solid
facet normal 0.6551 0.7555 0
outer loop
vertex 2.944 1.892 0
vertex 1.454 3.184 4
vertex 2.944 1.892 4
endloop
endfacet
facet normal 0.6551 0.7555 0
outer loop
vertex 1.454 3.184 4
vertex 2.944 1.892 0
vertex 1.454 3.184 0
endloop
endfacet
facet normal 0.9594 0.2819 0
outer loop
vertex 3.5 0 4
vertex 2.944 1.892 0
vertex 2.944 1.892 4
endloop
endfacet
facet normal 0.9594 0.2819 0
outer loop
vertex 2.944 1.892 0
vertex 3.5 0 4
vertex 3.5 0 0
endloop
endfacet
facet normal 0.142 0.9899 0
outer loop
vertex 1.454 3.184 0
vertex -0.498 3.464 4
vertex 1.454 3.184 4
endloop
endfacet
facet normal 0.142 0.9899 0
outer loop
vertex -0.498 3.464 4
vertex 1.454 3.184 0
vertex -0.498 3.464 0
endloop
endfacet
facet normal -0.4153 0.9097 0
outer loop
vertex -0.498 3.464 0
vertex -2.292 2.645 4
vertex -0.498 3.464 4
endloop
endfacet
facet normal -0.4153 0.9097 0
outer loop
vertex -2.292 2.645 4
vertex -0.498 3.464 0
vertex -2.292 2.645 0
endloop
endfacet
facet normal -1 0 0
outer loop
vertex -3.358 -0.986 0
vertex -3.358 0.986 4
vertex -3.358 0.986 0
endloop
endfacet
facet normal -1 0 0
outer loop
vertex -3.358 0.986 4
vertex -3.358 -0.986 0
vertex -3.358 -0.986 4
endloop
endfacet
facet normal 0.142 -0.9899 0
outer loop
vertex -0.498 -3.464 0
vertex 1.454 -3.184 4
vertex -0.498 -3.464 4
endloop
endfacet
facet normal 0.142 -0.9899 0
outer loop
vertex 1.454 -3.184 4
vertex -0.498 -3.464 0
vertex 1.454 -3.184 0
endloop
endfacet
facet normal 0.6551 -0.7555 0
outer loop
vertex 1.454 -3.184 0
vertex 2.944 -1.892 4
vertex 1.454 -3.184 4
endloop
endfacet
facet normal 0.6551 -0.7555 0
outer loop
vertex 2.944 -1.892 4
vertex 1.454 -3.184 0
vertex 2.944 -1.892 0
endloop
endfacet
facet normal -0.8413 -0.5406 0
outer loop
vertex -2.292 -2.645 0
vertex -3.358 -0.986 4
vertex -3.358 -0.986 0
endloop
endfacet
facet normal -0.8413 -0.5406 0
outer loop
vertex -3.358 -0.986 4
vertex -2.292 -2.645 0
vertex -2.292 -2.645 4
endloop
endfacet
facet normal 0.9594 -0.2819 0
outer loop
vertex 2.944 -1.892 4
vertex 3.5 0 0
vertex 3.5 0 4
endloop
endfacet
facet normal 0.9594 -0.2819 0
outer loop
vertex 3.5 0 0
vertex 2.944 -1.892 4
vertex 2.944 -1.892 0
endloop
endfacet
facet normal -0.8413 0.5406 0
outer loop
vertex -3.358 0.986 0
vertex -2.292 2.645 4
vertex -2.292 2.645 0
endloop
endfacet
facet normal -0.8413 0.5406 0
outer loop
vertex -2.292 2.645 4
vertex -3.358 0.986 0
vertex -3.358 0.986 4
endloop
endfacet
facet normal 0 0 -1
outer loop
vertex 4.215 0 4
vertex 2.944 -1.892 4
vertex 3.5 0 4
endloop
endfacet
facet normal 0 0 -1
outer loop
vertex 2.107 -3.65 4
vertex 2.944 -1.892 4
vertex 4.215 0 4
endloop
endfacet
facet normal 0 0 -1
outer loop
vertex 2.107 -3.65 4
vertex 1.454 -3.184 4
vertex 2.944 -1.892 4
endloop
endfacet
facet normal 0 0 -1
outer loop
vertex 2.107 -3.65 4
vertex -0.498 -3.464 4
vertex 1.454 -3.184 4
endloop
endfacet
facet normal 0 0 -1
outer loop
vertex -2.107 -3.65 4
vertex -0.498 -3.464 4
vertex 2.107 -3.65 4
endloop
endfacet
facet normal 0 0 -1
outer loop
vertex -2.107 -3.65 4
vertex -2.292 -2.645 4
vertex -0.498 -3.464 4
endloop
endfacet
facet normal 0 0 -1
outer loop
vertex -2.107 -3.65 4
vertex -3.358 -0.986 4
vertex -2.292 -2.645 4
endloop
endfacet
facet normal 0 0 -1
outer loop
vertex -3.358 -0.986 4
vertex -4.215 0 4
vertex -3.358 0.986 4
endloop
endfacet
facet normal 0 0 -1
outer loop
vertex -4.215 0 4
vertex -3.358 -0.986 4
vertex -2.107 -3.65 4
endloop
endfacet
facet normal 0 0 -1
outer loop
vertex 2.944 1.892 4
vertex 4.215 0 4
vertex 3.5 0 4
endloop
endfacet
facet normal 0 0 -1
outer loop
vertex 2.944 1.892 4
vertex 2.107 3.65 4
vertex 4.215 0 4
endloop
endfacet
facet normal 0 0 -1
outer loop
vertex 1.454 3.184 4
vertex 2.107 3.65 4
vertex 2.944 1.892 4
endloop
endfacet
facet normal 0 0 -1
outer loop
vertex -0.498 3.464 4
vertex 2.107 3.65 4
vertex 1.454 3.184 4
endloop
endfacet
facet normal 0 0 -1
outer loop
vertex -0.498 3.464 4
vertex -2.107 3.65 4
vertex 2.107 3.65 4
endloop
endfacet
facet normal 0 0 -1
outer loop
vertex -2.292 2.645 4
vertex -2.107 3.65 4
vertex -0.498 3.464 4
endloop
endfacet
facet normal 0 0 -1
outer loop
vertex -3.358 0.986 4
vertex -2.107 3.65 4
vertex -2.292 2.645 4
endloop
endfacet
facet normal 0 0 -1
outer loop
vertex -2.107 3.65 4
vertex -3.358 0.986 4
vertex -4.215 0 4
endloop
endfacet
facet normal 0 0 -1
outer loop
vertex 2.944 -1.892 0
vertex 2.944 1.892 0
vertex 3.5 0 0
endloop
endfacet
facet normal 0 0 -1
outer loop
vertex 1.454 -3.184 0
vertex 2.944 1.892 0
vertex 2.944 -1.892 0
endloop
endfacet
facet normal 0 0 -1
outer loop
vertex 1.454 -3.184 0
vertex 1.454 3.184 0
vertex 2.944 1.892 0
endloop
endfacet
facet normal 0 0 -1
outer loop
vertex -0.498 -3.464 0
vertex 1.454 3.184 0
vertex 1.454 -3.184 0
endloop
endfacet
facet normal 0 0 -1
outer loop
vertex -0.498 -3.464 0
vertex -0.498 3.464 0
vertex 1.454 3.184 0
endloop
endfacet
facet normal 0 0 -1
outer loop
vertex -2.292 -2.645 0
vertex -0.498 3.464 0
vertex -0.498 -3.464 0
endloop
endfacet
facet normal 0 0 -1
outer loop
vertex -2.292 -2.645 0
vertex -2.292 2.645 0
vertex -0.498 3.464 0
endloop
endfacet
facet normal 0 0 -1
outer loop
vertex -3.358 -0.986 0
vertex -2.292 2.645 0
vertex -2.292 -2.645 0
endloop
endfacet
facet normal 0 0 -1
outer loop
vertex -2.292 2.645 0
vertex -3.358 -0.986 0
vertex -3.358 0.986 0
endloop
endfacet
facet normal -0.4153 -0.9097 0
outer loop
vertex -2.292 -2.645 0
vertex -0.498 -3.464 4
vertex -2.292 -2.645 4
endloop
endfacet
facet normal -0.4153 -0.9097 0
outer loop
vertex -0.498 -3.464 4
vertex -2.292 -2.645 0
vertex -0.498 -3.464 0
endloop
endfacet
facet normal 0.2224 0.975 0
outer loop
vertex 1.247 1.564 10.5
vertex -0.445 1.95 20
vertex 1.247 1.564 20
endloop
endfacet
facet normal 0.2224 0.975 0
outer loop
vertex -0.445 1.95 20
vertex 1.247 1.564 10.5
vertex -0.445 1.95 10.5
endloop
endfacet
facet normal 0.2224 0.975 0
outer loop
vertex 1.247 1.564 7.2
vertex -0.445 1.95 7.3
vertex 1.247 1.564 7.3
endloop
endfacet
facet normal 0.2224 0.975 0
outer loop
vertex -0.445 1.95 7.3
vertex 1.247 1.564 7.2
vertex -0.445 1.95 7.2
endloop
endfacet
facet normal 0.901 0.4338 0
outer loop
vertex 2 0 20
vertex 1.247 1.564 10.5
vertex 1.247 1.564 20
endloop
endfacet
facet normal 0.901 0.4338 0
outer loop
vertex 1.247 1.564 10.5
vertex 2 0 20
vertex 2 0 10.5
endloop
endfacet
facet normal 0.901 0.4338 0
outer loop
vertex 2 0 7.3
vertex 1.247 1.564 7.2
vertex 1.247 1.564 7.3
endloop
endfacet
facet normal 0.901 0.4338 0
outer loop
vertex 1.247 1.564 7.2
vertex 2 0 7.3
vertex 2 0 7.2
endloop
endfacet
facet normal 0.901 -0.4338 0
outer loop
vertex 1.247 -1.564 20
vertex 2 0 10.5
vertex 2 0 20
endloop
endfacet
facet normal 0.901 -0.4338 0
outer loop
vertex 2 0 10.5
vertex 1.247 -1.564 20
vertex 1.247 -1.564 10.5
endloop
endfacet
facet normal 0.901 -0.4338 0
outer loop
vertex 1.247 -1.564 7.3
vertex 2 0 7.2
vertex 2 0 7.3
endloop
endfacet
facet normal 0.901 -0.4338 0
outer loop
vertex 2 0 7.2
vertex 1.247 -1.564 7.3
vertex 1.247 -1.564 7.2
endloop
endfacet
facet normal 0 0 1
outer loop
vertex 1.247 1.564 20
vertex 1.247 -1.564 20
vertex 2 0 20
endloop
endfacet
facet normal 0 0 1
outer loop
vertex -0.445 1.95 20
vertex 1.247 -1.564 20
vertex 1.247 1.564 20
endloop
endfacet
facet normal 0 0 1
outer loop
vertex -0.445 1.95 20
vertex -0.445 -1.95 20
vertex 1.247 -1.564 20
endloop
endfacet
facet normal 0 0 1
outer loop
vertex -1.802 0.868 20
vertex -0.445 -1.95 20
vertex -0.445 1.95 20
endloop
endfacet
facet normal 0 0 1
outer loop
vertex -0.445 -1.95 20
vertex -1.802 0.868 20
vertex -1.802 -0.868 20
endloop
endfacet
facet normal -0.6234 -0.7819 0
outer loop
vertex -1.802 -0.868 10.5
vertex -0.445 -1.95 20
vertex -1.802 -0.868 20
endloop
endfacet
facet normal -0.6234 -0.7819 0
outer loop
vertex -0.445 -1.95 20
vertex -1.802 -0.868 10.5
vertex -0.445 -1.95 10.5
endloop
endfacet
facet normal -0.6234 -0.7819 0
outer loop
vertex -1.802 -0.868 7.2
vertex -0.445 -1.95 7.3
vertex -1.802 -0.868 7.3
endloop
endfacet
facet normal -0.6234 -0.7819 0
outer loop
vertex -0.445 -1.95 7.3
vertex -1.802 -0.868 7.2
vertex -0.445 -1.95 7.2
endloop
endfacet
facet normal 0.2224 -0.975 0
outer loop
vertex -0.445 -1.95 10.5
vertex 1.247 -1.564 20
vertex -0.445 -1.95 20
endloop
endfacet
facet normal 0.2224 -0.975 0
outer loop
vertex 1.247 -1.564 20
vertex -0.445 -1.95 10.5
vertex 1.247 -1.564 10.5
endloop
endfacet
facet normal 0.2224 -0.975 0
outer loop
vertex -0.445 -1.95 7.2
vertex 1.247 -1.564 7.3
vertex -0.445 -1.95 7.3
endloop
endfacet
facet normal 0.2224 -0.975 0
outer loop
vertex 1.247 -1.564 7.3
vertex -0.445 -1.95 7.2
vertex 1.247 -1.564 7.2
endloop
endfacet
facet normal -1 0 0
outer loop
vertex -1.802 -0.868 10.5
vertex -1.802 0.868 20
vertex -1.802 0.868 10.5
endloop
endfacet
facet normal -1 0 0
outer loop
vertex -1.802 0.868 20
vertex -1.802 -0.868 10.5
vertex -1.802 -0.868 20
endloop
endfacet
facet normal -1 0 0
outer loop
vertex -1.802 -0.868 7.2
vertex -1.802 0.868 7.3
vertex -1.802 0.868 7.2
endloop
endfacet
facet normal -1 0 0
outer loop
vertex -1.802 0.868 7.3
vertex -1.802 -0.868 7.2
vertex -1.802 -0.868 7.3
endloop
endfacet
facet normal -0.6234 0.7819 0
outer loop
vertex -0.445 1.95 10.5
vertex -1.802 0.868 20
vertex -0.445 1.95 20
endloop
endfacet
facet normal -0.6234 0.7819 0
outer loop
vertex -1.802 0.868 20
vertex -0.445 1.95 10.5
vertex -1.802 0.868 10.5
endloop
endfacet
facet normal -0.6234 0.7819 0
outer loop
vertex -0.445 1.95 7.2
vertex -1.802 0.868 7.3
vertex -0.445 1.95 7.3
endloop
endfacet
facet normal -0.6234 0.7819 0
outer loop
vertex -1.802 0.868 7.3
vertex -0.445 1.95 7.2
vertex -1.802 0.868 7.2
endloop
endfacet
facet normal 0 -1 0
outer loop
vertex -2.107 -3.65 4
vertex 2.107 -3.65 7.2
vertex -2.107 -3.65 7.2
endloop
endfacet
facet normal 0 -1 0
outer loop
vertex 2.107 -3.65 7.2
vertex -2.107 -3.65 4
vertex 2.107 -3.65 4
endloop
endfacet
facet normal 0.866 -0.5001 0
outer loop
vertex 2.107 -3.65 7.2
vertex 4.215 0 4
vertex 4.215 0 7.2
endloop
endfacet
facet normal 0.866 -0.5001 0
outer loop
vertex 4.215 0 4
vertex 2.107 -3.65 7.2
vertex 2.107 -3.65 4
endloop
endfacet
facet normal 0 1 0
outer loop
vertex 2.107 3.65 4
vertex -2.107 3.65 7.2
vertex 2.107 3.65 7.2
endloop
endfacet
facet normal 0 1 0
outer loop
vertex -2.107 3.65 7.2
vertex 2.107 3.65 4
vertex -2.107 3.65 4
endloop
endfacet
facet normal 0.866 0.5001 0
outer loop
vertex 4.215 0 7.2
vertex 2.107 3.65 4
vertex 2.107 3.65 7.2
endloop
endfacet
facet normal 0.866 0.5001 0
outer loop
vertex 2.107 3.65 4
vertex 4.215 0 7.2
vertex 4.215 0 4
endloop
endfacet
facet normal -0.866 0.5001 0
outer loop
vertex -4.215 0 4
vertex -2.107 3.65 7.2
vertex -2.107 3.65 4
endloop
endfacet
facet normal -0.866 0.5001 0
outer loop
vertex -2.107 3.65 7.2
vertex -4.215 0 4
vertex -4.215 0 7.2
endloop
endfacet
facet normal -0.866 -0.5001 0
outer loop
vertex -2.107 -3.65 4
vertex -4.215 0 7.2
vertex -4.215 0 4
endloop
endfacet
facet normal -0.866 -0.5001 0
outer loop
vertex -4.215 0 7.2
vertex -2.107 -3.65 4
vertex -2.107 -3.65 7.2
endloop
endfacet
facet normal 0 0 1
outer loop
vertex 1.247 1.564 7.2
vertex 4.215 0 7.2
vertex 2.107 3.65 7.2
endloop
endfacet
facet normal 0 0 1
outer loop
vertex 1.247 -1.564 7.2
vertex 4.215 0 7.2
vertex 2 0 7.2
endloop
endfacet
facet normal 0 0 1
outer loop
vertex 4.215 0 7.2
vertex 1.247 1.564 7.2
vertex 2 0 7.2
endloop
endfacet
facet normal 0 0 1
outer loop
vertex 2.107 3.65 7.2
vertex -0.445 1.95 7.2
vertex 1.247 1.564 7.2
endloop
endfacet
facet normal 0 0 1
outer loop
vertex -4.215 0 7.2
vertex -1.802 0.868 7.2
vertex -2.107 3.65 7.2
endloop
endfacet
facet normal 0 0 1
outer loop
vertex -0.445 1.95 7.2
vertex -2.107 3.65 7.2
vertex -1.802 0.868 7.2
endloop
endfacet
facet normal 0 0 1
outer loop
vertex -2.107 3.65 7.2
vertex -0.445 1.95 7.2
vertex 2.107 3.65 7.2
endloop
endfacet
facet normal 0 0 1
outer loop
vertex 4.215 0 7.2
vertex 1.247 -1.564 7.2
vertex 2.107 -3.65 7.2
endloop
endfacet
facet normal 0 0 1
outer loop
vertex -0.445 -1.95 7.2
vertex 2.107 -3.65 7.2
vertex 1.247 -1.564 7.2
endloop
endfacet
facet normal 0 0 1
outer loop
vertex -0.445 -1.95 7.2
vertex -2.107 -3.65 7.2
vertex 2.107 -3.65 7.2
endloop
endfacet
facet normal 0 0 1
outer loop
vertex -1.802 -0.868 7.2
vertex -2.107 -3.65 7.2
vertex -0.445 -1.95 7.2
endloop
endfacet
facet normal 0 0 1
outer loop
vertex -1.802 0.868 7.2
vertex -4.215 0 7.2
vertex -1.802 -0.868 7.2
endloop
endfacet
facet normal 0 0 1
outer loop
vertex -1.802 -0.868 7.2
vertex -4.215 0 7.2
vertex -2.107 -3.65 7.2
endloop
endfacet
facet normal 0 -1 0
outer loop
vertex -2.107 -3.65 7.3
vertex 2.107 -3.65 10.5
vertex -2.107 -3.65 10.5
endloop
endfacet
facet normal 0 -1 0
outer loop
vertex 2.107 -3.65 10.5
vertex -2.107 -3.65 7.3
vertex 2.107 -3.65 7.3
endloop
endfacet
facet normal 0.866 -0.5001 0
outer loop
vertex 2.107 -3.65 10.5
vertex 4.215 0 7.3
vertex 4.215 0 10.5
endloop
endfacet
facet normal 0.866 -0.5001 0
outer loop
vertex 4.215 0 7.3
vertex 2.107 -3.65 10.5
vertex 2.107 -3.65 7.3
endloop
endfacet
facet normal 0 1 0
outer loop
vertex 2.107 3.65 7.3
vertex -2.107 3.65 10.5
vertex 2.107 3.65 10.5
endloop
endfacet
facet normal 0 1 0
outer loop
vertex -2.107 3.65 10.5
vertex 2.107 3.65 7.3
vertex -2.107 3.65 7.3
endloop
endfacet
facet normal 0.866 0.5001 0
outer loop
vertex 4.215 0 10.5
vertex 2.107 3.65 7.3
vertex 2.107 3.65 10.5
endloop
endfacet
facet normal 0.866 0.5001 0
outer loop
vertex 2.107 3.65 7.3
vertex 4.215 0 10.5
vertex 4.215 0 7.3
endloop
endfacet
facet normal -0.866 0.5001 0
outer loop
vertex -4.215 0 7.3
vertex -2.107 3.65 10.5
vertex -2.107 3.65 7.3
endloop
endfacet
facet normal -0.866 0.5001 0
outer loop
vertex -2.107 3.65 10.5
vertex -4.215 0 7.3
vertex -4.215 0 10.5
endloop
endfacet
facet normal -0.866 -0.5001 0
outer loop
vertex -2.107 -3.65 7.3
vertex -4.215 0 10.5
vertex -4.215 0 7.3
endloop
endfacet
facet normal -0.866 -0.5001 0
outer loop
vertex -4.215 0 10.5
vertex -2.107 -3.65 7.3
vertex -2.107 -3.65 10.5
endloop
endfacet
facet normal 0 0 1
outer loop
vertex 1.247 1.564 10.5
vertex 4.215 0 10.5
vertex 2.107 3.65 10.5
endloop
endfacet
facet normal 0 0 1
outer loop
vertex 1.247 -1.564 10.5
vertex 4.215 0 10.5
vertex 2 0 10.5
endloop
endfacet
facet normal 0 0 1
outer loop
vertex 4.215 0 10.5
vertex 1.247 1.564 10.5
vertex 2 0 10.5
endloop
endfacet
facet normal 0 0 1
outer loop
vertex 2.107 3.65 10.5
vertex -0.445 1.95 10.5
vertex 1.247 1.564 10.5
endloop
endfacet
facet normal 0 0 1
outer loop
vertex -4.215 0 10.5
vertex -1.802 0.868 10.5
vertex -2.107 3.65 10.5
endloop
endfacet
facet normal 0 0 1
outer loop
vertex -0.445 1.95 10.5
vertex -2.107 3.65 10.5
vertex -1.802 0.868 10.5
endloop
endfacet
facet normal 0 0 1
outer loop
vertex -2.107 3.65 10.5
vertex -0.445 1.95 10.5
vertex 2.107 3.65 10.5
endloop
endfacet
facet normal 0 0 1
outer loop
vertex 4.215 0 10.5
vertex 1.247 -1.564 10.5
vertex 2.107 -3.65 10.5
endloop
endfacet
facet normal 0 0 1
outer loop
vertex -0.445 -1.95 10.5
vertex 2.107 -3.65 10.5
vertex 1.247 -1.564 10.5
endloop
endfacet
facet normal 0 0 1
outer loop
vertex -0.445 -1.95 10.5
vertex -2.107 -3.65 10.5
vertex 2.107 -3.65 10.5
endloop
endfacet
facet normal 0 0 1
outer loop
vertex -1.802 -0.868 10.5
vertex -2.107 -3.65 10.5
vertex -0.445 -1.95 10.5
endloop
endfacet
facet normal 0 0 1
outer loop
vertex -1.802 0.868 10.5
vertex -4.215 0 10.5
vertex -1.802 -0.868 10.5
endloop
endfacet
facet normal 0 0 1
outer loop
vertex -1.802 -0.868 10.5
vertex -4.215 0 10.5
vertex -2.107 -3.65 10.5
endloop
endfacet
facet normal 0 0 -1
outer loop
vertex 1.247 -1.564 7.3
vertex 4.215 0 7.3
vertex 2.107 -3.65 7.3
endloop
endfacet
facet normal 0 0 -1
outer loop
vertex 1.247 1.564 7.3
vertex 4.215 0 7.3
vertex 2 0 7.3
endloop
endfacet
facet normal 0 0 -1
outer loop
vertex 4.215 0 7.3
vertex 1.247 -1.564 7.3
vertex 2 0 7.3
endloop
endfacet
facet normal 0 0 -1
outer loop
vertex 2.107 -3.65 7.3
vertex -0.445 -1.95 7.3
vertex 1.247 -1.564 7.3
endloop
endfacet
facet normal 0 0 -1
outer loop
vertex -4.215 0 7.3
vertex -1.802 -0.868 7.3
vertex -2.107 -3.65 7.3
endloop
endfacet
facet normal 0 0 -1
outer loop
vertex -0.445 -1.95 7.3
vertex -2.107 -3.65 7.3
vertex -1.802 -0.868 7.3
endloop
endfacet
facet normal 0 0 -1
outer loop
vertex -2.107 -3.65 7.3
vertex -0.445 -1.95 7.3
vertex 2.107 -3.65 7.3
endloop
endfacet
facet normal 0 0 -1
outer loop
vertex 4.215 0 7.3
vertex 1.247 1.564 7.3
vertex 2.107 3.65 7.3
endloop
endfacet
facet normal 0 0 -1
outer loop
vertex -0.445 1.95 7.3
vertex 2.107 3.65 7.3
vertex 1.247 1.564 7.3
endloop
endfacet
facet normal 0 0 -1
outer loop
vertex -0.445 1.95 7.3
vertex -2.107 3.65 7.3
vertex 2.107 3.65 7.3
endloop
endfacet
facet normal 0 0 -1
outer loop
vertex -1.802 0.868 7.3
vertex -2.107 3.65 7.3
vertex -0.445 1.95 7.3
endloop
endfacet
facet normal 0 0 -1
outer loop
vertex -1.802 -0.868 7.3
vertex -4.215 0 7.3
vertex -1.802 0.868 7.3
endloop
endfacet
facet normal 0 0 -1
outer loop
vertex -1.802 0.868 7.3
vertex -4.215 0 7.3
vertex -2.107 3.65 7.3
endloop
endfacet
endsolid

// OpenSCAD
translate(v = [0, 0, 4])
union(){union(){color("Gainsboro"){translate(v = [0, 0, -4])
cylinder(h = 4, r = 3.500);
}
color("DarkGray"){cylinder(h = 16, r = 2.000);
}
}
union(){translate(v = [0, 0, 0])
color("Gainsboro"){cylinder(h = 3.200, $fn = 6, r = 4.215);
}
translate(v = [0, 0, 3.3000000000000003])
color("Gainsboro"){cylinder(h = 3.200, $fn = 6, r = 4.215);
}
}
}
